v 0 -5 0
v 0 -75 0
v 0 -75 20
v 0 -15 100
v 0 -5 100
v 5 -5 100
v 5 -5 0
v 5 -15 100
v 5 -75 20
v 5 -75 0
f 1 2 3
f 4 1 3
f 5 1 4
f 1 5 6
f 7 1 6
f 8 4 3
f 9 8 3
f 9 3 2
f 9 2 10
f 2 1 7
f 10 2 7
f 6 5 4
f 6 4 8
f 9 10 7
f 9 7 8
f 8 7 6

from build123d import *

# Parameters (mm, degrees)
F0_W     = 5
F0_H     = 100
F1_DEPTH = 75
F3_DEPTH = 5
F4_DEPTH = 5


with BuildPart() as f1:
    # F0 (on Front) → F1 (new body)
    with BuildSketch(Plane.XZ):
        with Locations((2.5, 50)):
            Rectangle(F0_W, F0_H)
    extrude(amount=F1_DEPTH)

    # F2 (on face) → F3 (cut)
    with BuildSketch(Plane(origin=(0, 0, 0), x_dir=(0, -1, 0), z_dir=(-1, 0, 0))):
        Polygon((75, 100), (15, 100), (75, 20), align=None)
    extrude(amount=-F3_DEPTH, mode=Mode.SUBTRACT)

    # F4 (cut): a face of the model
    f4_faces = [f1.faces().sort_by_distance(p)[0] for p in [
        (2.5, 0, 50),
    ]]
    extrude(f4_faces, amount=-F4_DEPTH, mode=Mode.SUBTRACT)


solid = f1.part
